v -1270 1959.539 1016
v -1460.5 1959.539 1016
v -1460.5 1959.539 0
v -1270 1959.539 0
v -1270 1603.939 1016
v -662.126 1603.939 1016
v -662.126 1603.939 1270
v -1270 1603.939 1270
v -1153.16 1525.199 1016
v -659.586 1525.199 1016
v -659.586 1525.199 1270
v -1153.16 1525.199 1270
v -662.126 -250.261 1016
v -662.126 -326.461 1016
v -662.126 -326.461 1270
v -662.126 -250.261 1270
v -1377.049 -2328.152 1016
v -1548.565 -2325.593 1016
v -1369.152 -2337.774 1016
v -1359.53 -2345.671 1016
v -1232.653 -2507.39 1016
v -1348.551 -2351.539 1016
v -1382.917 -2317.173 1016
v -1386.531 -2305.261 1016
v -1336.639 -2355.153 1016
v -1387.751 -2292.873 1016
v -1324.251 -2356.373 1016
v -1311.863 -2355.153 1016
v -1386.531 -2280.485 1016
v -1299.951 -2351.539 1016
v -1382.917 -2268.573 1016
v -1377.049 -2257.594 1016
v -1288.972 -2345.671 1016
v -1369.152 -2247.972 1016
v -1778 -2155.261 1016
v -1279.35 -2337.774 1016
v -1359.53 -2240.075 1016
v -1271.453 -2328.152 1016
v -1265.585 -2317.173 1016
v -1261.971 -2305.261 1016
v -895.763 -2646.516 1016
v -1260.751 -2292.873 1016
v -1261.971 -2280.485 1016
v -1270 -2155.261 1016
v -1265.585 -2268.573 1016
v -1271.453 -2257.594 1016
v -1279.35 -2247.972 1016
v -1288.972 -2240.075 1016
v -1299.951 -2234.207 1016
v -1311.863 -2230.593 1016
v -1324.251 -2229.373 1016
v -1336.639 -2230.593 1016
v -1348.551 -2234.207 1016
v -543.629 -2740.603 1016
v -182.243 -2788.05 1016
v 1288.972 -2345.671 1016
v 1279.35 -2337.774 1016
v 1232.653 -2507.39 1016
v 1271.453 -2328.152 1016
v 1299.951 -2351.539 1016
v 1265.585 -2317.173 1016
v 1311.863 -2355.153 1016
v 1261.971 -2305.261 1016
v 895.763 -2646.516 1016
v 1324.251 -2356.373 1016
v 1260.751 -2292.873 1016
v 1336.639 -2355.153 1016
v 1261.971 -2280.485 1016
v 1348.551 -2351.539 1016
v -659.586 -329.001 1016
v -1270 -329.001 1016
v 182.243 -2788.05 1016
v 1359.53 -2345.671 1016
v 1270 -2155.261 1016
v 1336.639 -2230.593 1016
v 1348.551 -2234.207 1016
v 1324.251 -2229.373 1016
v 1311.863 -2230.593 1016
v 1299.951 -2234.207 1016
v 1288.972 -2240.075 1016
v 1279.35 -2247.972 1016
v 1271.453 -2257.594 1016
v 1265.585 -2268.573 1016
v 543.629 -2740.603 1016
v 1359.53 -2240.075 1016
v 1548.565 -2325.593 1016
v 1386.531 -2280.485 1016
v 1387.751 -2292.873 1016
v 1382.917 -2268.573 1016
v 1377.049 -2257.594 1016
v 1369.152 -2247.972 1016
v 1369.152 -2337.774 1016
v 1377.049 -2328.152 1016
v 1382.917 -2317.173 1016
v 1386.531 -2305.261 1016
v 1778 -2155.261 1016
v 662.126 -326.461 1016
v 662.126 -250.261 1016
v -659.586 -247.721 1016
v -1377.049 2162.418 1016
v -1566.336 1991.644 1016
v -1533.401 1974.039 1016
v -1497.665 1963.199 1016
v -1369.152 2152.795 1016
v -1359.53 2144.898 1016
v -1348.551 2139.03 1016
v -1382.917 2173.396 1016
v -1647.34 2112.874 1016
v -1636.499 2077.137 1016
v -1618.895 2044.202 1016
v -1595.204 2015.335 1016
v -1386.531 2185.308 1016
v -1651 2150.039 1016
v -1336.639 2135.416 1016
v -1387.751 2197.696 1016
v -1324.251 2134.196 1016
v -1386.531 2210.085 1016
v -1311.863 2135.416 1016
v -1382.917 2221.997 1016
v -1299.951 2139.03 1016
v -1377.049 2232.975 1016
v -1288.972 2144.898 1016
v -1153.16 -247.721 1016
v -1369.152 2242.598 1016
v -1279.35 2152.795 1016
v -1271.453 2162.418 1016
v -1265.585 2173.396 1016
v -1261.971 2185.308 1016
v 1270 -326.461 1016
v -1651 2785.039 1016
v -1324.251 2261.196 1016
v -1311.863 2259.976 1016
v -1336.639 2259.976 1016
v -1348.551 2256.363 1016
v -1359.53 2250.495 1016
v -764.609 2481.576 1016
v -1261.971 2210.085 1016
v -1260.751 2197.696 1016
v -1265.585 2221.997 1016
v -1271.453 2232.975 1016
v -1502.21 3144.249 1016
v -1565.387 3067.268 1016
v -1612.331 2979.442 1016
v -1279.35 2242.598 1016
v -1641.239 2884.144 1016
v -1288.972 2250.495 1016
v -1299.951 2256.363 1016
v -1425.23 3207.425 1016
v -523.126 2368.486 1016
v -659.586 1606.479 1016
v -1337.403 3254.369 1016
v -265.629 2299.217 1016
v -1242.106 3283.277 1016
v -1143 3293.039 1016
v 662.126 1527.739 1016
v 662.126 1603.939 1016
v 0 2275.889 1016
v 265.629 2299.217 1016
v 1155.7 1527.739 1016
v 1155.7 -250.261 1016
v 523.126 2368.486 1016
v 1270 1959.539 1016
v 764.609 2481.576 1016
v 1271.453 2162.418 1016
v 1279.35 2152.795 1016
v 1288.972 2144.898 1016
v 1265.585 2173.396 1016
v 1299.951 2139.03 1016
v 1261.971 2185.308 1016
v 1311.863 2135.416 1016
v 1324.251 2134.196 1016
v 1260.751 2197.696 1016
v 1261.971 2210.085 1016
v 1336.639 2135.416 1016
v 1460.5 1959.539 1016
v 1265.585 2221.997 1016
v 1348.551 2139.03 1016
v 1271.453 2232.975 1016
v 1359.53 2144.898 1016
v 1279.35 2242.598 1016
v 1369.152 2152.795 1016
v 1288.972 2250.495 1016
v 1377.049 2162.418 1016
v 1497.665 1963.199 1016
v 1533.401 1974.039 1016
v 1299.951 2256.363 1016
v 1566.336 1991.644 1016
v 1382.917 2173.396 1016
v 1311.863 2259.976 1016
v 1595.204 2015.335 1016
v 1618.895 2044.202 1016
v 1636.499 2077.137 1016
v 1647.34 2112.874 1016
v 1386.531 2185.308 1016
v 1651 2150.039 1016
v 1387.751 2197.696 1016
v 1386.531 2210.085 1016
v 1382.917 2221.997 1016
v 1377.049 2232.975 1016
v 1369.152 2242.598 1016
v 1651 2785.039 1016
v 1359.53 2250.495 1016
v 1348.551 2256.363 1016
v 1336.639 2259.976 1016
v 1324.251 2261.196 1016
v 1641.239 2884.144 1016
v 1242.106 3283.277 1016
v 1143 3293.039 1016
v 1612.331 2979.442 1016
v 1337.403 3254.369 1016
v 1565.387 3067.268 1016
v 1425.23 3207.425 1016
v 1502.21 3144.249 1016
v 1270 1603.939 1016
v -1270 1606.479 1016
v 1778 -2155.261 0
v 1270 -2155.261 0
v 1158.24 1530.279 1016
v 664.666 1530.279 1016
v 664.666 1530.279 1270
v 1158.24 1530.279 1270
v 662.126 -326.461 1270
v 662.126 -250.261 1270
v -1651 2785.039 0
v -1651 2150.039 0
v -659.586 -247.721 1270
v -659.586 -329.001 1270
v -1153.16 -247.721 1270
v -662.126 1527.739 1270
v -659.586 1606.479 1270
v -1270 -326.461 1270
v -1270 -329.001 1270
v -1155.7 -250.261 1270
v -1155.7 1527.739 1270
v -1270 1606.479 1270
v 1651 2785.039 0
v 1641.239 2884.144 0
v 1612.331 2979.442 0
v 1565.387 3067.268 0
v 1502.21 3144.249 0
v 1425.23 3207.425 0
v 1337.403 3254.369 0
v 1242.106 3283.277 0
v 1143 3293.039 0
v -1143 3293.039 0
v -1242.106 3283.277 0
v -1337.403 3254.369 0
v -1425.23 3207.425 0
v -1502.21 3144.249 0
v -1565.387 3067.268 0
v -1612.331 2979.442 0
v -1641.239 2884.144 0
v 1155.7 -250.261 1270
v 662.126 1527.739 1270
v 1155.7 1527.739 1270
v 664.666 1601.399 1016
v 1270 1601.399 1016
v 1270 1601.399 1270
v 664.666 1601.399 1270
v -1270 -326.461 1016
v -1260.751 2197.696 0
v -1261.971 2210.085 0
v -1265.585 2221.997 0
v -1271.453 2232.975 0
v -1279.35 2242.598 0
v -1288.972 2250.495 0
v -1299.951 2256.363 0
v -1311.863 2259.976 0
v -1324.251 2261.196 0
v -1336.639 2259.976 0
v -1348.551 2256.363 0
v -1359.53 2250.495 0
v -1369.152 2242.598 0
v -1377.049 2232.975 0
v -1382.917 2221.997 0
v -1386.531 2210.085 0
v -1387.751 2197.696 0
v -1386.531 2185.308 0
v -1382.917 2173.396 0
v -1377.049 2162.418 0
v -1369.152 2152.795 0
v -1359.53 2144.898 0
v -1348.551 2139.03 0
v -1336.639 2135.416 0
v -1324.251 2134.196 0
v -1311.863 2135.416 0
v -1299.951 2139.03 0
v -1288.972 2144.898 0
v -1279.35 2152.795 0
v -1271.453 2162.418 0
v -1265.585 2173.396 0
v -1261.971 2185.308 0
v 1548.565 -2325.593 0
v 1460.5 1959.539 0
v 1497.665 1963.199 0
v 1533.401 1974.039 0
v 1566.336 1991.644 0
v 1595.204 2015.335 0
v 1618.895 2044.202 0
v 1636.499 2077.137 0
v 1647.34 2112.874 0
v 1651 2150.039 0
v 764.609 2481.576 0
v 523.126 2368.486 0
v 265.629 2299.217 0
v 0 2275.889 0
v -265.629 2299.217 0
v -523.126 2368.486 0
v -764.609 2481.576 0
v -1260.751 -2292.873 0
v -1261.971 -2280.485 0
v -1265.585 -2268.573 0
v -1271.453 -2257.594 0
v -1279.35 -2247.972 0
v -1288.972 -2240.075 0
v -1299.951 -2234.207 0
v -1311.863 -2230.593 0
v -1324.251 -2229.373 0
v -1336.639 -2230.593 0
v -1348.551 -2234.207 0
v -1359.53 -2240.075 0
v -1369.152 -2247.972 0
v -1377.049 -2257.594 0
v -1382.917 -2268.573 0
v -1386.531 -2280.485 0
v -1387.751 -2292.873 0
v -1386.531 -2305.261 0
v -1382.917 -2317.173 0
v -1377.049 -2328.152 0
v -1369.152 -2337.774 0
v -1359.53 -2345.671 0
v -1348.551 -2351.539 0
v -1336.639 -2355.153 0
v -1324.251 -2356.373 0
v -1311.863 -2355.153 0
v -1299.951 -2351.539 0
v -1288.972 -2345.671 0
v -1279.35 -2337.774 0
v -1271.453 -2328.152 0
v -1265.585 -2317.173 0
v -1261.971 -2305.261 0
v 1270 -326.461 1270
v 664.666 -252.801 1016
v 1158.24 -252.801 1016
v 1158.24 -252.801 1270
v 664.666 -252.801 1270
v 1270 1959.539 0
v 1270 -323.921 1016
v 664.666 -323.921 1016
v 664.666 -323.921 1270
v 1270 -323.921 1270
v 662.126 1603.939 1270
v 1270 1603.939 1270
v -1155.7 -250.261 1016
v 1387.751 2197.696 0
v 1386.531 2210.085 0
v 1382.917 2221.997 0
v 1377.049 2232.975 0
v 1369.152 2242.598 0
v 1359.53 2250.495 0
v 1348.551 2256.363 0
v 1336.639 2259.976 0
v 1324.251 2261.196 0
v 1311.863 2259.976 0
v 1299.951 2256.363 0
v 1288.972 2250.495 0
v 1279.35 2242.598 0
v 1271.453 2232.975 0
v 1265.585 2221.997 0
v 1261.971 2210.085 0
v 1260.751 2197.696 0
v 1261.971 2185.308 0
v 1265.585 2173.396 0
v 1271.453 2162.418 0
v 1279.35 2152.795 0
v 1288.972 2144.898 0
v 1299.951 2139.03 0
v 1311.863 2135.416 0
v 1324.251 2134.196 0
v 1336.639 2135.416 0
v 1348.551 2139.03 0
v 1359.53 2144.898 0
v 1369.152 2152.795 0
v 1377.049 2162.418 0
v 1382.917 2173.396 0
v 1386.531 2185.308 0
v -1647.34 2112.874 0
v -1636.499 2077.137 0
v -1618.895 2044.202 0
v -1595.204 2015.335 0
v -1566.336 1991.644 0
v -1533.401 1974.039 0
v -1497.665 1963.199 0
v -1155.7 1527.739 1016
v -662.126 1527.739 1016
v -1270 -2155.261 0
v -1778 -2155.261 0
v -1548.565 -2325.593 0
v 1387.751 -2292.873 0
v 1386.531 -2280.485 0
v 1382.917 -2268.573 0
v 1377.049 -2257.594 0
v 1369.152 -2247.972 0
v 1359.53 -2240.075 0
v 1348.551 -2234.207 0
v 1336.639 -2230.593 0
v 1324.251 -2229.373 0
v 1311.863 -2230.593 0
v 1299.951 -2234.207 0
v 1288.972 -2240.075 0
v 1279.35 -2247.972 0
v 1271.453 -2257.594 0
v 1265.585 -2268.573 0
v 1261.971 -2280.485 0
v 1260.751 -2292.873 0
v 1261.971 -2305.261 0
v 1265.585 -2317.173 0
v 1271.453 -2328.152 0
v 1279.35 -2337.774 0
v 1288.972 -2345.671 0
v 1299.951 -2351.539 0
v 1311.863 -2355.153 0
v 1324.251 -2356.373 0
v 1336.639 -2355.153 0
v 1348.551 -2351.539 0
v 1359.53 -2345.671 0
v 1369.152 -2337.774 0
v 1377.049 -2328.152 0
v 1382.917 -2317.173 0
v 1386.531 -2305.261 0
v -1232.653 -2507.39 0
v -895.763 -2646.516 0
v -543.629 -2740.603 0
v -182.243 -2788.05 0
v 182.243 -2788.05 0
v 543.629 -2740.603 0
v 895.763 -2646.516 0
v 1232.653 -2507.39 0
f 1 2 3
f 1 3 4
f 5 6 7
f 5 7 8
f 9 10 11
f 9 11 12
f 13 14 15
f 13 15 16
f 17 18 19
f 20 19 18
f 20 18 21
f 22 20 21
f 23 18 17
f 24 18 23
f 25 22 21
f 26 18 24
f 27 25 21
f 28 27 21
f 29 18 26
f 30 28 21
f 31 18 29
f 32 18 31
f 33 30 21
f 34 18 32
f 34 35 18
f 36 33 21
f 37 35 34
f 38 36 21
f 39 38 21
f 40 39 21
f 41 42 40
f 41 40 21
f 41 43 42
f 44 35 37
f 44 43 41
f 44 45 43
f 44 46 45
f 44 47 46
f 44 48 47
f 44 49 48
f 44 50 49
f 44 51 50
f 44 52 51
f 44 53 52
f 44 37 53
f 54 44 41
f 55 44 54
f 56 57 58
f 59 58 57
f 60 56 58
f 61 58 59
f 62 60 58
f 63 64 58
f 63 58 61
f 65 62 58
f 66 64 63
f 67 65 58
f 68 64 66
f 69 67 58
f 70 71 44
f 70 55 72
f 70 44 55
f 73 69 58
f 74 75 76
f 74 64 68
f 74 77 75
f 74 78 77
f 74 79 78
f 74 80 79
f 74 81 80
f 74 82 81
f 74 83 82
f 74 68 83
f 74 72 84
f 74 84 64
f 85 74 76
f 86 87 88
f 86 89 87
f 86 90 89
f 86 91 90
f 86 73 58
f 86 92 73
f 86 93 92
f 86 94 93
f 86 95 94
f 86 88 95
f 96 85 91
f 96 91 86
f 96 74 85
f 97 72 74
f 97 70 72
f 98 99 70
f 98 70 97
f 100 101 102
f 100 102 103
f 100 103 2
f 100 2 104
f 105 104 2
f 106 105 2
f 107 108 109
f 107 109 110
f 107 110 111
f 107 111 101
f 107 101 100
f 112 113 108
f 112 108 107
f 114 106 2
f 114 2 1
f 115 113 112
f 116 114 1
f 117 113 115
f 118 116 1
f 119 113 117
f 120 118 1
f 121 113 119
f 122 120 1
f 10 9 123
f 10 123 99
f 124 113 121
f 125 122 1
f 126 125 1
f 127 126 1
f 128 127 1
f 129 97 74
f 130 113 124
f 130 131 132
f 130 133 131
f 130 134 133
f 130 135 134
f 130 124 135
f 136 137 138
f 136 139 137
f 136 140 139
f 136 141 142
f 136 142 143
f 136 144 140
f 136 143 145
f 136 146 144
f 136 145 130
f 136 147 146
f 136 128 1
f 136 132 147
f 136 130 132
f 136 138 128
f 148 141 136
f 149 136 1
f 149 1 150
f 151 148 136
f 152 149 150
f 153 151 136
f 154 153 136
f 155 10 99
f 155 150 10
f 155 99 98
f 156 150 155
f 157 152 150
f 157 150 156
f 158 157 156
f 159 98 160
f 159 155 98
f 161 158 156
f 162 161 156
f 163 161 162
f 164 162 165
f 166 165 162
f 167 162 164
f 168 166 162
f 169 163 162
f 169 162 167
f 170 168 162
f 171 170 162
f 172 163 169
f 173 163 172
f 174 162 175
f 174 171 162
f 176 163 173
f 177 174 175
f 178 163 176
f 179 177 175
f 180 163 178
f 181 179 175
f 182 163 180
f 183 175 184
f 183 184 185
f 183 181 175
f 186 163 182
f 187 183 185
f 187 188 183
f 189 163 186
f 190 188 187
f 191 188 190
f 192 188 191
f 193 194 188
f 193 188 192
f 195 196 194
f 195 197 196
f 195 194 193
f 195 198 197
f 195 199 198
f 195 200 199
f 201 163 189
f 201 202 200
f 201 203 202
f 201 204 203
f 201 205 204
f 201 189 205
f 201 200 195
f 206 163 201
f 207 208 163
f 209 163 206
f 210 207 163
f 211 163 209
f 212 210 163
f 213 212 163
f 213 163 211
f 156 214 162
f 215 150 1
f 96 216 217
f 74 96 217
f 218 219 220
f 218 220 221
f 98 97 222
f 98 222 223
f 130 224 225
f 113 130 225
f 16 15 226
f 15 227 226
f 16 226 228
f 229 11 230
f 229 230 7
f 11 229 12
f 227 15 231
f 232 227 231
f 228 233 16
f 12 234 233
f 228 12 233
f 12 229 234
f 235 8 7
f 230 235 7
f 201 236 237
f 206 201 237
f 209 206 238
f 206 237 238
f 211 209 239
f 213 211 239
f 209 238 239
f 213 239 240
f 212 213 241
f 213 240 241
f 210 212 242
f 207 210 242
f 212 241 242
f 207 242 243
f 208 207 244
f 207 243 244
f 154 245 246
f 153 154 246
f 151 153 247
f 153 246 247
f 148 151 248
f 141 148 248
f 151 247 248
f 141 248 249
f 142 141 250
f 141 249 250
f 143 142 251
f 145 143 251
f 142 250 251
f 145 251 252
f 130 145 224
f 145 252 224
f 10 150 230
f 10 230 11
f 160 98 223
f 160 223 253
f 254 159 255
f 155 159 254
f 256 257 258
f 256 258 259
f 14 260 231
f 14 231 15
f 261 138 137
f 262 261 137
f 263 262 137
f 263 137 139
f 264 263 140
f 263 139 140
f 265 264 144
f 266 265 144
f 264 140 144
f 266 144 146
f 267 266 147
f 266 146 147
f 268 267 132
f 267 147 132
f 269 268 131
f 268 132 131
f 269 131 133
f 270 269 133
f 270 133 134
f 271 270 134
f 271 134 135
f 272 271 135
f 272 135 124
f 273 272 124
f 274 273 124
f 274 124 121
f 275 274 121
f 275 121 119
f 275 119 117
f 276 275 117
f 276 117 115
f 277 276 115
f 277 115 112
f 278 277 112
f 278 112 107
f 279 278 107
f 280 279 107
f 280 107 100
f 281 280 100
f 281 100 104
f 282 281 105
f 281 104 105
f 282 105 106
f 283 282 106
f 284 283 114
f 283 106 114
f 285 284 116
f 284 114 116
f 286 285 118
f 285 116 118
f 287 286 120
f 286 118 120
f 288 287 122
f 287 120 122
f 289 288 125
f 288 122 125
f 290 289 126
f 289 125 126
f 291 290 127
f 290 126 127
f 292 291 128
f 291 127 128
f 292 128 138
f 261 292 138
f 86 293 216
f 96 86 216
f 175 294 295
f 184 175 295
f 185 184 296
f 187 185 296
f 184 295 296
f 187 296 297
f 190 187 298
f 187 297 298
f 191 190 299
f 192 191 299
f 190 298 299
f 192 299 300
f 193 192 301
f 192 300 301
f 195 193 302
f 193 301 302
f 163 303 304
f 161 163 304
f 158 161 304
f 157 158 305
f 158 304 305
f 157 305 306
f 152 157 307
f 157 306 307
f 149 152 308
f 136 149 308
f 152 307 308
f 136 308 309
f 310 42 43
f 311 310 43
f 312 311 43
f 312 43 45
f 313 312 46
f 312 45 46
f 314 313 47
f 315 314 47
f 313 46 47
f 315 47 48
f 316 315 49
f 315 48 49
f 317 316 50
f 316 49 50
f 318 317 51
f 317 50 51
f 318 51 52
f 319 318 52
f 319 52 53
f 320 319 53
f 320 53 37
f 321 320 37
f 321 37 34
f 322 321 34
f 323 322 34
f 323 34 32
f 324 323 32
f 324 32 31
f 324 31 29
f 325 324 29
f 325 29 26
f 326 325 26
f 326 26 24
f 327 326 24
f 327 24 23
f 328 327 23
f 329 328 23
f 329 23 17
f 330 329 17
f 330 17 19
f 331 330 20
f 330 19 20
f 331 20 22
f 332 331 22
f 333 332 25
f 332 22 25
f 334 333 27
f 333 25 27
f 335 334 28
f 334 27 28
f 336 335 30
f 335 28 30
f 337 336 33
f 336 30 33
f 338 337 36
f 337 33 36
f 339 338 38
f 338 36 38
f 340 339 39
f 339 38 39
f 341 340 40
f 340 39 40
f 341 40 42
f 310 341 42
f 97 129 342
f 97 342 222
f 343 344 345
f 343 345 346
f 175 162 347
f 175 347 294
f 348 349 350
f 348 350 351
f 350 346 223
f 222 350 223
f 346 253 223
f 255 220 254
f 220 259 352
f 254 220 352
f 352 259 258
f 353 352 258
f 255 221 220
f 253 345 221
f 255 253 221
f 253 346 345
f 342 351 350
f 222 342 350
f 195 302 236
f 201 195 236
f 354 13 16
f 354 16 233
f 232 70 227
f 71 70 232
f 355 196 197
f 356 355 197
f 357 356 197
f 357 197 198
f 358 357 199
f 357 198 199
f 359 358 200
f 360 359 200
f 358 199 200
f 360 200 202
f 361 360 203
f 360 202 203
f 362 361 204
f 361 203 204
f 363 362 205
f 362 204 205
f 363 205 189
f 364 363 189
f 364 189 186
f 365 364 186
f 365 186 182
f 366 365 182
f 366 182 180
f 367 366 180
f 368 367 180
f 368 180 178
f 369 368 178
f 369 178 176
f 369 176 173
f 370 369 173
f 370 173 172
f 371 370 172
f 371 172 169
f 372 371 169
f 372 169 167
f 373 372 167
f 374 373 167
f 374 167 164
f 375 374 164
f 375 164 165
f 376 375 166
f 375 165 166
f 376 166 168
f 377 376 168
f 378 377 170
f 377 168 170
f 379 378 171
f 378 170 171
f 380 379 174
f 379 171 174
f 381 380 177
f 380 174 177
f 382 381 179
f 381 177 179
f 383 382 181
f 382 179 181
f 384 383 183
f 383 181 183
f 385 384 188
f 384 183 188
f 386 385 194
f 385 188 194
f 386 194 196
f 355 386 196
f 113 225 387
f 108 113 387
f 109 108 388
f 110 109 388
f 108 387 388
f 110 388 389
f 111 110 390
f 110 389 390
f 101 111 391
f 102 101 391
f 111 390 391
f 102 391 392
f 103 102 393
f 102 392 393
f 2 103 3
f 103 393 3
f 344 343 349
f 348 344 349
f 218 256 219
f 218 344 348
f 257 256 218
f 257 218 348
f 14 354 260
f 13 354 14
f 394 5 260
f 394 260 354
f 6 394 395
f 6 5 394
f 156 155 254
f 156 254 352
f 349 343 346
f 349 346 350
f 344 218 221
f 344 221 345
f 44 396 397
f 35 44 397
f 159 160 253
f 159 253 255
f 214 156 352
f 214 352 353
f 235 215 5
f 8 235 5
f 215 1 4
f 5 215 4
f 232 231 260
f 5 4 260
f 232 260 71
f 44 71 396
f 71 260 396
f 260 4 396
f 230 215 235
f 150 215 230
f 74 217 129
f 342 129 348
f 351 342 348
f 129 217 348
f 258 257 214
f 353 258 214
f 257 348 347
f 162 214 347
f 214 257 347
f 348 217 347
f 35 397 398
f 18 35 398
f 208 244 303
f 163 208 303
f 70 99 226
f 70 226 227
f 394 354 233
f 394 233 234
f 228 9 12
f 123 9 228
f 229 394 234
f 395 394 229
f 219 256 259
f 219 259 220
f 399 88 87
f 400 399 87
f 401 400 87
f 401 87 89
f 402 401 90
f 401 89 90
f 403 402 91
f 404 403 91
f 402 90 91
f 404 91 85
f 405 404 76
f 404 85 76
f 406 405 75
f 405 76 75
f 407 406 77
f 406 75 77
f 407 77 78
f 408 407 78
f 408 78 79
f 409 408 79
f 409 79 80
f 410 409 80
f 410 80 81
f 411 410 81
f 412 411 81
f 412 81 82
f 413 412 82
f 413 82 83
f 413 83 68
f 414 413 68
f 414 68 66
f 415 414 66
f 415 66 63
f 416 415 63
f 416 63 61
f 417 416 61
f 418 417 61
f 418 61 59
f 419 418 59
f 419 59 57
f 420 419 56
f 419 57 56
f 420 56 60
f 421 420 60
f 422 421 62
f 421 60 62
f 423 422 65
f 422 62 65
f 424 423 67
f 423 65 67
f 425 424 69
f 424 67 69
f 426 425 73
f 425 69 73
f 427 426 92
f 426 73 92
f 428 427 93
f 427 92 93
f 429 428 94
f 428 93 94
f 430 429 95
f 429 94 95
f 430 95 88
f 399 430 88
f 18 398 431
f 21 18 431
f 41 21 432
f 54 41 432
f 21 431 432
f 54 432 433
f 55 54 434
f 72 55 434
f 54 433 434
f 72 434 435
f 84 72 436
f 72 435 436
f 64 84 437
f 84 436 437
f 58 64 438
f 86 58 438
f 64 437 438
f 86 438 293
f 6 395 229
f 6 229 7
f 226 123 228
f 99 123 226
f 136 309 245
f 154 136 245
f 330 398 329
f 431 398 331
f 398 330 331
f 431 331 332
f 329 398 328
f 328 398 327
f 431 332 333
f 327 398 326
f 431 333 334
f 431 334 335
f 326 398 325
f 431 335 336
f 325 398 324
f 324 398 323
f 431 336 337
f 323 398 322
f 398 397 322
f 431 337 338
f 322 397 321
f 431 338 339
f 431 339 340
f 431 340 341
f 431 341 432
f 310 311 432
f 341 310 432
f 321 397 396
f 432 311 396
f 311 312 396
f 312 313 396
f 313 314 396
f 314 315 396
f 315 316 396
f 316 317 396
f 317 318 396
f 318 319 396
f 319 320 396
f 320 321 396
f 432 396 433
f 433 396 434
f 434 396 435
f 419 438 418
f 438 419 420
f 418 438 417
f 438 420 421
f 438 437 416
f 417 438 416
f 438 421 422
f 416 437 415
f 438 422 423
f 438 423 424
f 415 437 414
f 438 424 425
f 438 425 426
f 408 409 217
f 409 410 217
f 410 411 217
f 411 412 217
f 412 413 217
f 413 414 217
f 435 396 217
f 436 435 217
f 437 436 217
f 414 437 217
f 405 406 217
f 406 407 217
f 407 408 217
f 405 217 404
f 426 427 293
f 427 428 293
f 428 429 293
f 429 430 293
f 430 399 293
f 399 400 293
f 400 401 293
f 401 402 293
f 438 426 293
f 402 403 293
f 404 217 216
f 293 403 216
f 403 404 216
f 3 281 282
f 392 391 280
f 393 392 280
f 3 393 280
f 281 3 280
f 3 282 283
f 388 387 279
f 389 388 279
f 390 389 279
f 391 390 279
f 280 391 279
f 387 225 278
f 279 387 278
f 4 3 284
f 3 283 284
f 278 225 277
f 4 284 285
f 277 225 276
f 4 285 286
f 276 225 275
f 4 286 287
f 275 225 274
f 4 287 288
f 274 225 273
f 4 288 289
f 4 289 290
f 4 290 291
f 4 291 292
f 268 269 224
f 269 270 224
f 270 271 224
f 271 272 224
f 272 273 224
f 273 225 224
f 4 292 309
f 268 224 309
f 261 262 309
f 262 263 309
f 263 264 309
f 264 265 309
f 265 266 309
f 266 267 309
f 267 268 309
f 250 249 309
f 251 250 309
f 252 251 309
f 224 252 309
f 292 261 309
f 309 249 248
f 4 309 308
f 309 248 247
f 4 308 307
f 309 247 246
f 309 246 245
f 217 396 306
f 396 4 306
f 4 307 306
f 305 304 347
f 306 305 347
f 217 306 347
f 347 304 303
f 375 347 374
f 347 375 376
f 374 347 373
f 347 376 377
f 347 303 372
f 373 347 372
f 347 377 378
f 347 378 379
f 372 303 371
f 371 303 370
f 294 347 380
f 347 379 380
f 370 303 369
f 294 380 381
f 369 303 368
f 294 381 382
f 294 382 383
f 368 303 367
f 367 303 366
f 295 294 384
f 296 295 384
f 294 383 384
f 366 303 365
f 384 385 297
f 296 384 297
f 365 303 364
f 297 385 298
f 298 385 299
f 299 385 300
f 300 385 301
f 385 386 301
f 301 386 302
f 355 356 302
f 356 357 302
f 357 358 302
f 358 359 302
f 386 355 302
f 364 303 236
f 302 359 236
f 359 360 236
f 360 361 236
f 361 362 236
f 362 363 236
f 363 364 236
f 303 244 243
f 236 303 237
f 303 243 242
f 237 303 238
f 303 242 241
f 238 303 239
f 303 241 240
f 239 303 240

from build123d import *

# Parameters (mm, degrees)
BOSS_EXTRUDE1_DEPTH = 1016
EXTRUDE_THIN1_DEPTH = 254
SKETCH6_R           = 63.5
CUT_EXTRUDE1_DEPTH  = 2032


with BuildPart() as part:
    # Sketch2 → Boss-Extrude1 (new body)
    with BuildSketch(Plane.XY):
        with BuildLine():
            Line((1270, -2155.261469057), (1270, 1959.538530943))
            Line((1270, 1959.538530943), (1460.5, 1959.538530943))
            ThreePointArc((1460.5, 1959.538530943), (1595.203841816, 2015.334689127), (1651, 2150.038530943))
            Line((1651, 2150.038530943), (1651, 2785.038530943))
            ThreePointArc((1651, 2785.038530943), (1502.210244843, 3144.248775786), (1143, 3293.038530943))
            Line((1143, 3293.038530943), (764.60873935, 2481.57585382))
            ThreePointArc((764.60873935, 2481.57585382), (0, 2275.888971296), (-764.60873935, 2481.57585382))
            Line((-764.60873935, 2481.57585382), (-1143, 3293.038530943))
            ThreePointArc((-1143, 3293.038530943), (-1502.210244843, 3144.248775786), (-1651, 2785.038530943))
            Line((-1651, 2785.038530943), (-1651, 2150.038530943))
            ThreePointArc((-1651, 2150.038530943), (-1595.203841816, 2015.334689127), (-1460.5, 1959.538530943))
            Line((-1460.5, 1959.538530943), (-1270, 1959.538530943))
            Line((-1270, 1959.538530943), (-1270, -2155.261469057))
            Line((-1270, -2155.261469057), (-1778, -2155.261469057))
            Line((-1778, -2155.261469057), (-1548.565234395, -2325.592766333))
            ThreePointArc((-1548.565234395, -2325.592766333), (0, -2794), (1548.565234395, -2325.592766333))
            Line((1548.565234395, -2325.592766333), (1778, -2155.261469057))
            Line((1778, -2155.261469057), (1270, -2155.261469057))
        make_face()
    extrude(amount=BOSS_EXTRUDE1_DEPTH)

    # Sketch5 → Extrude-Thin1 (add)
    with BuildSketch(Plane.XY.offset(1016)):
        Polygon((1270, -326.461469057), (662.125525201, -326.461469057), (662.125525201, -250.261469057), (1155.7, -250.261469057), (1155.7, 1527.738530943), (662.125525201, 1527.738530943), (662.125525201, 1603.938530943), (1270, 1603.938530943), (1270, 1601.398530943), (664.665525201, 1601.398530943), (664.665525201, 1530.278530943), (1158.24, 1530.278530943), (1158.24, -252.801469057), (664.665525201, -252.801469057), (664.665525201, -323.921469057), (1270, -323.921469057), align=None)
        Polygon((-1270, -326.461469057), (-662.125525201, -326.461469057), (-662.125525201, -250.261469057), (-1155.7, -250.261469057), (-1155.7, 1527.738530943), (-662.125525201, 1527.738530943), (-662.125525201, 1603.938530943), (-1270, 1603.938530943), (-1270, 1606.478530943), (-659.585525201, 1606.478530943), (-659.585525201, 1525.198530943), (-1153.16, 1525.198530943), (-1153.16, -247.721469057), (-659.585525201, -247.721469057), (-659.585525201, -329.001469057), (-1270, -329.001469057), align=None)
    extrude(amount=EXTRUDE_THIN1_DEPTH)

    # Sketch6 → Cut-Extrude1 (cut)
    with BuildSketch(Plane.XY.offset(1016)):
        with Locations((1324.251050402, 2197.696291545)):
            Circle(SKETCH6_R)
        with Locations((1324.251050402, -2292.872975525)):
            Circle(SKETCH6_R)
        with Locations((-1324.251050402, -2292.872975525)):
            Circle(SKETCH6_R)
        with Locations((-1324.251050402, 2197.696291545)):
            Circle(SKETCH6_R)
    extrude(amount=-CUT_EXTRUDE1_DEPTH, mode=Mode.SUBTRACT)


solid = part.part
